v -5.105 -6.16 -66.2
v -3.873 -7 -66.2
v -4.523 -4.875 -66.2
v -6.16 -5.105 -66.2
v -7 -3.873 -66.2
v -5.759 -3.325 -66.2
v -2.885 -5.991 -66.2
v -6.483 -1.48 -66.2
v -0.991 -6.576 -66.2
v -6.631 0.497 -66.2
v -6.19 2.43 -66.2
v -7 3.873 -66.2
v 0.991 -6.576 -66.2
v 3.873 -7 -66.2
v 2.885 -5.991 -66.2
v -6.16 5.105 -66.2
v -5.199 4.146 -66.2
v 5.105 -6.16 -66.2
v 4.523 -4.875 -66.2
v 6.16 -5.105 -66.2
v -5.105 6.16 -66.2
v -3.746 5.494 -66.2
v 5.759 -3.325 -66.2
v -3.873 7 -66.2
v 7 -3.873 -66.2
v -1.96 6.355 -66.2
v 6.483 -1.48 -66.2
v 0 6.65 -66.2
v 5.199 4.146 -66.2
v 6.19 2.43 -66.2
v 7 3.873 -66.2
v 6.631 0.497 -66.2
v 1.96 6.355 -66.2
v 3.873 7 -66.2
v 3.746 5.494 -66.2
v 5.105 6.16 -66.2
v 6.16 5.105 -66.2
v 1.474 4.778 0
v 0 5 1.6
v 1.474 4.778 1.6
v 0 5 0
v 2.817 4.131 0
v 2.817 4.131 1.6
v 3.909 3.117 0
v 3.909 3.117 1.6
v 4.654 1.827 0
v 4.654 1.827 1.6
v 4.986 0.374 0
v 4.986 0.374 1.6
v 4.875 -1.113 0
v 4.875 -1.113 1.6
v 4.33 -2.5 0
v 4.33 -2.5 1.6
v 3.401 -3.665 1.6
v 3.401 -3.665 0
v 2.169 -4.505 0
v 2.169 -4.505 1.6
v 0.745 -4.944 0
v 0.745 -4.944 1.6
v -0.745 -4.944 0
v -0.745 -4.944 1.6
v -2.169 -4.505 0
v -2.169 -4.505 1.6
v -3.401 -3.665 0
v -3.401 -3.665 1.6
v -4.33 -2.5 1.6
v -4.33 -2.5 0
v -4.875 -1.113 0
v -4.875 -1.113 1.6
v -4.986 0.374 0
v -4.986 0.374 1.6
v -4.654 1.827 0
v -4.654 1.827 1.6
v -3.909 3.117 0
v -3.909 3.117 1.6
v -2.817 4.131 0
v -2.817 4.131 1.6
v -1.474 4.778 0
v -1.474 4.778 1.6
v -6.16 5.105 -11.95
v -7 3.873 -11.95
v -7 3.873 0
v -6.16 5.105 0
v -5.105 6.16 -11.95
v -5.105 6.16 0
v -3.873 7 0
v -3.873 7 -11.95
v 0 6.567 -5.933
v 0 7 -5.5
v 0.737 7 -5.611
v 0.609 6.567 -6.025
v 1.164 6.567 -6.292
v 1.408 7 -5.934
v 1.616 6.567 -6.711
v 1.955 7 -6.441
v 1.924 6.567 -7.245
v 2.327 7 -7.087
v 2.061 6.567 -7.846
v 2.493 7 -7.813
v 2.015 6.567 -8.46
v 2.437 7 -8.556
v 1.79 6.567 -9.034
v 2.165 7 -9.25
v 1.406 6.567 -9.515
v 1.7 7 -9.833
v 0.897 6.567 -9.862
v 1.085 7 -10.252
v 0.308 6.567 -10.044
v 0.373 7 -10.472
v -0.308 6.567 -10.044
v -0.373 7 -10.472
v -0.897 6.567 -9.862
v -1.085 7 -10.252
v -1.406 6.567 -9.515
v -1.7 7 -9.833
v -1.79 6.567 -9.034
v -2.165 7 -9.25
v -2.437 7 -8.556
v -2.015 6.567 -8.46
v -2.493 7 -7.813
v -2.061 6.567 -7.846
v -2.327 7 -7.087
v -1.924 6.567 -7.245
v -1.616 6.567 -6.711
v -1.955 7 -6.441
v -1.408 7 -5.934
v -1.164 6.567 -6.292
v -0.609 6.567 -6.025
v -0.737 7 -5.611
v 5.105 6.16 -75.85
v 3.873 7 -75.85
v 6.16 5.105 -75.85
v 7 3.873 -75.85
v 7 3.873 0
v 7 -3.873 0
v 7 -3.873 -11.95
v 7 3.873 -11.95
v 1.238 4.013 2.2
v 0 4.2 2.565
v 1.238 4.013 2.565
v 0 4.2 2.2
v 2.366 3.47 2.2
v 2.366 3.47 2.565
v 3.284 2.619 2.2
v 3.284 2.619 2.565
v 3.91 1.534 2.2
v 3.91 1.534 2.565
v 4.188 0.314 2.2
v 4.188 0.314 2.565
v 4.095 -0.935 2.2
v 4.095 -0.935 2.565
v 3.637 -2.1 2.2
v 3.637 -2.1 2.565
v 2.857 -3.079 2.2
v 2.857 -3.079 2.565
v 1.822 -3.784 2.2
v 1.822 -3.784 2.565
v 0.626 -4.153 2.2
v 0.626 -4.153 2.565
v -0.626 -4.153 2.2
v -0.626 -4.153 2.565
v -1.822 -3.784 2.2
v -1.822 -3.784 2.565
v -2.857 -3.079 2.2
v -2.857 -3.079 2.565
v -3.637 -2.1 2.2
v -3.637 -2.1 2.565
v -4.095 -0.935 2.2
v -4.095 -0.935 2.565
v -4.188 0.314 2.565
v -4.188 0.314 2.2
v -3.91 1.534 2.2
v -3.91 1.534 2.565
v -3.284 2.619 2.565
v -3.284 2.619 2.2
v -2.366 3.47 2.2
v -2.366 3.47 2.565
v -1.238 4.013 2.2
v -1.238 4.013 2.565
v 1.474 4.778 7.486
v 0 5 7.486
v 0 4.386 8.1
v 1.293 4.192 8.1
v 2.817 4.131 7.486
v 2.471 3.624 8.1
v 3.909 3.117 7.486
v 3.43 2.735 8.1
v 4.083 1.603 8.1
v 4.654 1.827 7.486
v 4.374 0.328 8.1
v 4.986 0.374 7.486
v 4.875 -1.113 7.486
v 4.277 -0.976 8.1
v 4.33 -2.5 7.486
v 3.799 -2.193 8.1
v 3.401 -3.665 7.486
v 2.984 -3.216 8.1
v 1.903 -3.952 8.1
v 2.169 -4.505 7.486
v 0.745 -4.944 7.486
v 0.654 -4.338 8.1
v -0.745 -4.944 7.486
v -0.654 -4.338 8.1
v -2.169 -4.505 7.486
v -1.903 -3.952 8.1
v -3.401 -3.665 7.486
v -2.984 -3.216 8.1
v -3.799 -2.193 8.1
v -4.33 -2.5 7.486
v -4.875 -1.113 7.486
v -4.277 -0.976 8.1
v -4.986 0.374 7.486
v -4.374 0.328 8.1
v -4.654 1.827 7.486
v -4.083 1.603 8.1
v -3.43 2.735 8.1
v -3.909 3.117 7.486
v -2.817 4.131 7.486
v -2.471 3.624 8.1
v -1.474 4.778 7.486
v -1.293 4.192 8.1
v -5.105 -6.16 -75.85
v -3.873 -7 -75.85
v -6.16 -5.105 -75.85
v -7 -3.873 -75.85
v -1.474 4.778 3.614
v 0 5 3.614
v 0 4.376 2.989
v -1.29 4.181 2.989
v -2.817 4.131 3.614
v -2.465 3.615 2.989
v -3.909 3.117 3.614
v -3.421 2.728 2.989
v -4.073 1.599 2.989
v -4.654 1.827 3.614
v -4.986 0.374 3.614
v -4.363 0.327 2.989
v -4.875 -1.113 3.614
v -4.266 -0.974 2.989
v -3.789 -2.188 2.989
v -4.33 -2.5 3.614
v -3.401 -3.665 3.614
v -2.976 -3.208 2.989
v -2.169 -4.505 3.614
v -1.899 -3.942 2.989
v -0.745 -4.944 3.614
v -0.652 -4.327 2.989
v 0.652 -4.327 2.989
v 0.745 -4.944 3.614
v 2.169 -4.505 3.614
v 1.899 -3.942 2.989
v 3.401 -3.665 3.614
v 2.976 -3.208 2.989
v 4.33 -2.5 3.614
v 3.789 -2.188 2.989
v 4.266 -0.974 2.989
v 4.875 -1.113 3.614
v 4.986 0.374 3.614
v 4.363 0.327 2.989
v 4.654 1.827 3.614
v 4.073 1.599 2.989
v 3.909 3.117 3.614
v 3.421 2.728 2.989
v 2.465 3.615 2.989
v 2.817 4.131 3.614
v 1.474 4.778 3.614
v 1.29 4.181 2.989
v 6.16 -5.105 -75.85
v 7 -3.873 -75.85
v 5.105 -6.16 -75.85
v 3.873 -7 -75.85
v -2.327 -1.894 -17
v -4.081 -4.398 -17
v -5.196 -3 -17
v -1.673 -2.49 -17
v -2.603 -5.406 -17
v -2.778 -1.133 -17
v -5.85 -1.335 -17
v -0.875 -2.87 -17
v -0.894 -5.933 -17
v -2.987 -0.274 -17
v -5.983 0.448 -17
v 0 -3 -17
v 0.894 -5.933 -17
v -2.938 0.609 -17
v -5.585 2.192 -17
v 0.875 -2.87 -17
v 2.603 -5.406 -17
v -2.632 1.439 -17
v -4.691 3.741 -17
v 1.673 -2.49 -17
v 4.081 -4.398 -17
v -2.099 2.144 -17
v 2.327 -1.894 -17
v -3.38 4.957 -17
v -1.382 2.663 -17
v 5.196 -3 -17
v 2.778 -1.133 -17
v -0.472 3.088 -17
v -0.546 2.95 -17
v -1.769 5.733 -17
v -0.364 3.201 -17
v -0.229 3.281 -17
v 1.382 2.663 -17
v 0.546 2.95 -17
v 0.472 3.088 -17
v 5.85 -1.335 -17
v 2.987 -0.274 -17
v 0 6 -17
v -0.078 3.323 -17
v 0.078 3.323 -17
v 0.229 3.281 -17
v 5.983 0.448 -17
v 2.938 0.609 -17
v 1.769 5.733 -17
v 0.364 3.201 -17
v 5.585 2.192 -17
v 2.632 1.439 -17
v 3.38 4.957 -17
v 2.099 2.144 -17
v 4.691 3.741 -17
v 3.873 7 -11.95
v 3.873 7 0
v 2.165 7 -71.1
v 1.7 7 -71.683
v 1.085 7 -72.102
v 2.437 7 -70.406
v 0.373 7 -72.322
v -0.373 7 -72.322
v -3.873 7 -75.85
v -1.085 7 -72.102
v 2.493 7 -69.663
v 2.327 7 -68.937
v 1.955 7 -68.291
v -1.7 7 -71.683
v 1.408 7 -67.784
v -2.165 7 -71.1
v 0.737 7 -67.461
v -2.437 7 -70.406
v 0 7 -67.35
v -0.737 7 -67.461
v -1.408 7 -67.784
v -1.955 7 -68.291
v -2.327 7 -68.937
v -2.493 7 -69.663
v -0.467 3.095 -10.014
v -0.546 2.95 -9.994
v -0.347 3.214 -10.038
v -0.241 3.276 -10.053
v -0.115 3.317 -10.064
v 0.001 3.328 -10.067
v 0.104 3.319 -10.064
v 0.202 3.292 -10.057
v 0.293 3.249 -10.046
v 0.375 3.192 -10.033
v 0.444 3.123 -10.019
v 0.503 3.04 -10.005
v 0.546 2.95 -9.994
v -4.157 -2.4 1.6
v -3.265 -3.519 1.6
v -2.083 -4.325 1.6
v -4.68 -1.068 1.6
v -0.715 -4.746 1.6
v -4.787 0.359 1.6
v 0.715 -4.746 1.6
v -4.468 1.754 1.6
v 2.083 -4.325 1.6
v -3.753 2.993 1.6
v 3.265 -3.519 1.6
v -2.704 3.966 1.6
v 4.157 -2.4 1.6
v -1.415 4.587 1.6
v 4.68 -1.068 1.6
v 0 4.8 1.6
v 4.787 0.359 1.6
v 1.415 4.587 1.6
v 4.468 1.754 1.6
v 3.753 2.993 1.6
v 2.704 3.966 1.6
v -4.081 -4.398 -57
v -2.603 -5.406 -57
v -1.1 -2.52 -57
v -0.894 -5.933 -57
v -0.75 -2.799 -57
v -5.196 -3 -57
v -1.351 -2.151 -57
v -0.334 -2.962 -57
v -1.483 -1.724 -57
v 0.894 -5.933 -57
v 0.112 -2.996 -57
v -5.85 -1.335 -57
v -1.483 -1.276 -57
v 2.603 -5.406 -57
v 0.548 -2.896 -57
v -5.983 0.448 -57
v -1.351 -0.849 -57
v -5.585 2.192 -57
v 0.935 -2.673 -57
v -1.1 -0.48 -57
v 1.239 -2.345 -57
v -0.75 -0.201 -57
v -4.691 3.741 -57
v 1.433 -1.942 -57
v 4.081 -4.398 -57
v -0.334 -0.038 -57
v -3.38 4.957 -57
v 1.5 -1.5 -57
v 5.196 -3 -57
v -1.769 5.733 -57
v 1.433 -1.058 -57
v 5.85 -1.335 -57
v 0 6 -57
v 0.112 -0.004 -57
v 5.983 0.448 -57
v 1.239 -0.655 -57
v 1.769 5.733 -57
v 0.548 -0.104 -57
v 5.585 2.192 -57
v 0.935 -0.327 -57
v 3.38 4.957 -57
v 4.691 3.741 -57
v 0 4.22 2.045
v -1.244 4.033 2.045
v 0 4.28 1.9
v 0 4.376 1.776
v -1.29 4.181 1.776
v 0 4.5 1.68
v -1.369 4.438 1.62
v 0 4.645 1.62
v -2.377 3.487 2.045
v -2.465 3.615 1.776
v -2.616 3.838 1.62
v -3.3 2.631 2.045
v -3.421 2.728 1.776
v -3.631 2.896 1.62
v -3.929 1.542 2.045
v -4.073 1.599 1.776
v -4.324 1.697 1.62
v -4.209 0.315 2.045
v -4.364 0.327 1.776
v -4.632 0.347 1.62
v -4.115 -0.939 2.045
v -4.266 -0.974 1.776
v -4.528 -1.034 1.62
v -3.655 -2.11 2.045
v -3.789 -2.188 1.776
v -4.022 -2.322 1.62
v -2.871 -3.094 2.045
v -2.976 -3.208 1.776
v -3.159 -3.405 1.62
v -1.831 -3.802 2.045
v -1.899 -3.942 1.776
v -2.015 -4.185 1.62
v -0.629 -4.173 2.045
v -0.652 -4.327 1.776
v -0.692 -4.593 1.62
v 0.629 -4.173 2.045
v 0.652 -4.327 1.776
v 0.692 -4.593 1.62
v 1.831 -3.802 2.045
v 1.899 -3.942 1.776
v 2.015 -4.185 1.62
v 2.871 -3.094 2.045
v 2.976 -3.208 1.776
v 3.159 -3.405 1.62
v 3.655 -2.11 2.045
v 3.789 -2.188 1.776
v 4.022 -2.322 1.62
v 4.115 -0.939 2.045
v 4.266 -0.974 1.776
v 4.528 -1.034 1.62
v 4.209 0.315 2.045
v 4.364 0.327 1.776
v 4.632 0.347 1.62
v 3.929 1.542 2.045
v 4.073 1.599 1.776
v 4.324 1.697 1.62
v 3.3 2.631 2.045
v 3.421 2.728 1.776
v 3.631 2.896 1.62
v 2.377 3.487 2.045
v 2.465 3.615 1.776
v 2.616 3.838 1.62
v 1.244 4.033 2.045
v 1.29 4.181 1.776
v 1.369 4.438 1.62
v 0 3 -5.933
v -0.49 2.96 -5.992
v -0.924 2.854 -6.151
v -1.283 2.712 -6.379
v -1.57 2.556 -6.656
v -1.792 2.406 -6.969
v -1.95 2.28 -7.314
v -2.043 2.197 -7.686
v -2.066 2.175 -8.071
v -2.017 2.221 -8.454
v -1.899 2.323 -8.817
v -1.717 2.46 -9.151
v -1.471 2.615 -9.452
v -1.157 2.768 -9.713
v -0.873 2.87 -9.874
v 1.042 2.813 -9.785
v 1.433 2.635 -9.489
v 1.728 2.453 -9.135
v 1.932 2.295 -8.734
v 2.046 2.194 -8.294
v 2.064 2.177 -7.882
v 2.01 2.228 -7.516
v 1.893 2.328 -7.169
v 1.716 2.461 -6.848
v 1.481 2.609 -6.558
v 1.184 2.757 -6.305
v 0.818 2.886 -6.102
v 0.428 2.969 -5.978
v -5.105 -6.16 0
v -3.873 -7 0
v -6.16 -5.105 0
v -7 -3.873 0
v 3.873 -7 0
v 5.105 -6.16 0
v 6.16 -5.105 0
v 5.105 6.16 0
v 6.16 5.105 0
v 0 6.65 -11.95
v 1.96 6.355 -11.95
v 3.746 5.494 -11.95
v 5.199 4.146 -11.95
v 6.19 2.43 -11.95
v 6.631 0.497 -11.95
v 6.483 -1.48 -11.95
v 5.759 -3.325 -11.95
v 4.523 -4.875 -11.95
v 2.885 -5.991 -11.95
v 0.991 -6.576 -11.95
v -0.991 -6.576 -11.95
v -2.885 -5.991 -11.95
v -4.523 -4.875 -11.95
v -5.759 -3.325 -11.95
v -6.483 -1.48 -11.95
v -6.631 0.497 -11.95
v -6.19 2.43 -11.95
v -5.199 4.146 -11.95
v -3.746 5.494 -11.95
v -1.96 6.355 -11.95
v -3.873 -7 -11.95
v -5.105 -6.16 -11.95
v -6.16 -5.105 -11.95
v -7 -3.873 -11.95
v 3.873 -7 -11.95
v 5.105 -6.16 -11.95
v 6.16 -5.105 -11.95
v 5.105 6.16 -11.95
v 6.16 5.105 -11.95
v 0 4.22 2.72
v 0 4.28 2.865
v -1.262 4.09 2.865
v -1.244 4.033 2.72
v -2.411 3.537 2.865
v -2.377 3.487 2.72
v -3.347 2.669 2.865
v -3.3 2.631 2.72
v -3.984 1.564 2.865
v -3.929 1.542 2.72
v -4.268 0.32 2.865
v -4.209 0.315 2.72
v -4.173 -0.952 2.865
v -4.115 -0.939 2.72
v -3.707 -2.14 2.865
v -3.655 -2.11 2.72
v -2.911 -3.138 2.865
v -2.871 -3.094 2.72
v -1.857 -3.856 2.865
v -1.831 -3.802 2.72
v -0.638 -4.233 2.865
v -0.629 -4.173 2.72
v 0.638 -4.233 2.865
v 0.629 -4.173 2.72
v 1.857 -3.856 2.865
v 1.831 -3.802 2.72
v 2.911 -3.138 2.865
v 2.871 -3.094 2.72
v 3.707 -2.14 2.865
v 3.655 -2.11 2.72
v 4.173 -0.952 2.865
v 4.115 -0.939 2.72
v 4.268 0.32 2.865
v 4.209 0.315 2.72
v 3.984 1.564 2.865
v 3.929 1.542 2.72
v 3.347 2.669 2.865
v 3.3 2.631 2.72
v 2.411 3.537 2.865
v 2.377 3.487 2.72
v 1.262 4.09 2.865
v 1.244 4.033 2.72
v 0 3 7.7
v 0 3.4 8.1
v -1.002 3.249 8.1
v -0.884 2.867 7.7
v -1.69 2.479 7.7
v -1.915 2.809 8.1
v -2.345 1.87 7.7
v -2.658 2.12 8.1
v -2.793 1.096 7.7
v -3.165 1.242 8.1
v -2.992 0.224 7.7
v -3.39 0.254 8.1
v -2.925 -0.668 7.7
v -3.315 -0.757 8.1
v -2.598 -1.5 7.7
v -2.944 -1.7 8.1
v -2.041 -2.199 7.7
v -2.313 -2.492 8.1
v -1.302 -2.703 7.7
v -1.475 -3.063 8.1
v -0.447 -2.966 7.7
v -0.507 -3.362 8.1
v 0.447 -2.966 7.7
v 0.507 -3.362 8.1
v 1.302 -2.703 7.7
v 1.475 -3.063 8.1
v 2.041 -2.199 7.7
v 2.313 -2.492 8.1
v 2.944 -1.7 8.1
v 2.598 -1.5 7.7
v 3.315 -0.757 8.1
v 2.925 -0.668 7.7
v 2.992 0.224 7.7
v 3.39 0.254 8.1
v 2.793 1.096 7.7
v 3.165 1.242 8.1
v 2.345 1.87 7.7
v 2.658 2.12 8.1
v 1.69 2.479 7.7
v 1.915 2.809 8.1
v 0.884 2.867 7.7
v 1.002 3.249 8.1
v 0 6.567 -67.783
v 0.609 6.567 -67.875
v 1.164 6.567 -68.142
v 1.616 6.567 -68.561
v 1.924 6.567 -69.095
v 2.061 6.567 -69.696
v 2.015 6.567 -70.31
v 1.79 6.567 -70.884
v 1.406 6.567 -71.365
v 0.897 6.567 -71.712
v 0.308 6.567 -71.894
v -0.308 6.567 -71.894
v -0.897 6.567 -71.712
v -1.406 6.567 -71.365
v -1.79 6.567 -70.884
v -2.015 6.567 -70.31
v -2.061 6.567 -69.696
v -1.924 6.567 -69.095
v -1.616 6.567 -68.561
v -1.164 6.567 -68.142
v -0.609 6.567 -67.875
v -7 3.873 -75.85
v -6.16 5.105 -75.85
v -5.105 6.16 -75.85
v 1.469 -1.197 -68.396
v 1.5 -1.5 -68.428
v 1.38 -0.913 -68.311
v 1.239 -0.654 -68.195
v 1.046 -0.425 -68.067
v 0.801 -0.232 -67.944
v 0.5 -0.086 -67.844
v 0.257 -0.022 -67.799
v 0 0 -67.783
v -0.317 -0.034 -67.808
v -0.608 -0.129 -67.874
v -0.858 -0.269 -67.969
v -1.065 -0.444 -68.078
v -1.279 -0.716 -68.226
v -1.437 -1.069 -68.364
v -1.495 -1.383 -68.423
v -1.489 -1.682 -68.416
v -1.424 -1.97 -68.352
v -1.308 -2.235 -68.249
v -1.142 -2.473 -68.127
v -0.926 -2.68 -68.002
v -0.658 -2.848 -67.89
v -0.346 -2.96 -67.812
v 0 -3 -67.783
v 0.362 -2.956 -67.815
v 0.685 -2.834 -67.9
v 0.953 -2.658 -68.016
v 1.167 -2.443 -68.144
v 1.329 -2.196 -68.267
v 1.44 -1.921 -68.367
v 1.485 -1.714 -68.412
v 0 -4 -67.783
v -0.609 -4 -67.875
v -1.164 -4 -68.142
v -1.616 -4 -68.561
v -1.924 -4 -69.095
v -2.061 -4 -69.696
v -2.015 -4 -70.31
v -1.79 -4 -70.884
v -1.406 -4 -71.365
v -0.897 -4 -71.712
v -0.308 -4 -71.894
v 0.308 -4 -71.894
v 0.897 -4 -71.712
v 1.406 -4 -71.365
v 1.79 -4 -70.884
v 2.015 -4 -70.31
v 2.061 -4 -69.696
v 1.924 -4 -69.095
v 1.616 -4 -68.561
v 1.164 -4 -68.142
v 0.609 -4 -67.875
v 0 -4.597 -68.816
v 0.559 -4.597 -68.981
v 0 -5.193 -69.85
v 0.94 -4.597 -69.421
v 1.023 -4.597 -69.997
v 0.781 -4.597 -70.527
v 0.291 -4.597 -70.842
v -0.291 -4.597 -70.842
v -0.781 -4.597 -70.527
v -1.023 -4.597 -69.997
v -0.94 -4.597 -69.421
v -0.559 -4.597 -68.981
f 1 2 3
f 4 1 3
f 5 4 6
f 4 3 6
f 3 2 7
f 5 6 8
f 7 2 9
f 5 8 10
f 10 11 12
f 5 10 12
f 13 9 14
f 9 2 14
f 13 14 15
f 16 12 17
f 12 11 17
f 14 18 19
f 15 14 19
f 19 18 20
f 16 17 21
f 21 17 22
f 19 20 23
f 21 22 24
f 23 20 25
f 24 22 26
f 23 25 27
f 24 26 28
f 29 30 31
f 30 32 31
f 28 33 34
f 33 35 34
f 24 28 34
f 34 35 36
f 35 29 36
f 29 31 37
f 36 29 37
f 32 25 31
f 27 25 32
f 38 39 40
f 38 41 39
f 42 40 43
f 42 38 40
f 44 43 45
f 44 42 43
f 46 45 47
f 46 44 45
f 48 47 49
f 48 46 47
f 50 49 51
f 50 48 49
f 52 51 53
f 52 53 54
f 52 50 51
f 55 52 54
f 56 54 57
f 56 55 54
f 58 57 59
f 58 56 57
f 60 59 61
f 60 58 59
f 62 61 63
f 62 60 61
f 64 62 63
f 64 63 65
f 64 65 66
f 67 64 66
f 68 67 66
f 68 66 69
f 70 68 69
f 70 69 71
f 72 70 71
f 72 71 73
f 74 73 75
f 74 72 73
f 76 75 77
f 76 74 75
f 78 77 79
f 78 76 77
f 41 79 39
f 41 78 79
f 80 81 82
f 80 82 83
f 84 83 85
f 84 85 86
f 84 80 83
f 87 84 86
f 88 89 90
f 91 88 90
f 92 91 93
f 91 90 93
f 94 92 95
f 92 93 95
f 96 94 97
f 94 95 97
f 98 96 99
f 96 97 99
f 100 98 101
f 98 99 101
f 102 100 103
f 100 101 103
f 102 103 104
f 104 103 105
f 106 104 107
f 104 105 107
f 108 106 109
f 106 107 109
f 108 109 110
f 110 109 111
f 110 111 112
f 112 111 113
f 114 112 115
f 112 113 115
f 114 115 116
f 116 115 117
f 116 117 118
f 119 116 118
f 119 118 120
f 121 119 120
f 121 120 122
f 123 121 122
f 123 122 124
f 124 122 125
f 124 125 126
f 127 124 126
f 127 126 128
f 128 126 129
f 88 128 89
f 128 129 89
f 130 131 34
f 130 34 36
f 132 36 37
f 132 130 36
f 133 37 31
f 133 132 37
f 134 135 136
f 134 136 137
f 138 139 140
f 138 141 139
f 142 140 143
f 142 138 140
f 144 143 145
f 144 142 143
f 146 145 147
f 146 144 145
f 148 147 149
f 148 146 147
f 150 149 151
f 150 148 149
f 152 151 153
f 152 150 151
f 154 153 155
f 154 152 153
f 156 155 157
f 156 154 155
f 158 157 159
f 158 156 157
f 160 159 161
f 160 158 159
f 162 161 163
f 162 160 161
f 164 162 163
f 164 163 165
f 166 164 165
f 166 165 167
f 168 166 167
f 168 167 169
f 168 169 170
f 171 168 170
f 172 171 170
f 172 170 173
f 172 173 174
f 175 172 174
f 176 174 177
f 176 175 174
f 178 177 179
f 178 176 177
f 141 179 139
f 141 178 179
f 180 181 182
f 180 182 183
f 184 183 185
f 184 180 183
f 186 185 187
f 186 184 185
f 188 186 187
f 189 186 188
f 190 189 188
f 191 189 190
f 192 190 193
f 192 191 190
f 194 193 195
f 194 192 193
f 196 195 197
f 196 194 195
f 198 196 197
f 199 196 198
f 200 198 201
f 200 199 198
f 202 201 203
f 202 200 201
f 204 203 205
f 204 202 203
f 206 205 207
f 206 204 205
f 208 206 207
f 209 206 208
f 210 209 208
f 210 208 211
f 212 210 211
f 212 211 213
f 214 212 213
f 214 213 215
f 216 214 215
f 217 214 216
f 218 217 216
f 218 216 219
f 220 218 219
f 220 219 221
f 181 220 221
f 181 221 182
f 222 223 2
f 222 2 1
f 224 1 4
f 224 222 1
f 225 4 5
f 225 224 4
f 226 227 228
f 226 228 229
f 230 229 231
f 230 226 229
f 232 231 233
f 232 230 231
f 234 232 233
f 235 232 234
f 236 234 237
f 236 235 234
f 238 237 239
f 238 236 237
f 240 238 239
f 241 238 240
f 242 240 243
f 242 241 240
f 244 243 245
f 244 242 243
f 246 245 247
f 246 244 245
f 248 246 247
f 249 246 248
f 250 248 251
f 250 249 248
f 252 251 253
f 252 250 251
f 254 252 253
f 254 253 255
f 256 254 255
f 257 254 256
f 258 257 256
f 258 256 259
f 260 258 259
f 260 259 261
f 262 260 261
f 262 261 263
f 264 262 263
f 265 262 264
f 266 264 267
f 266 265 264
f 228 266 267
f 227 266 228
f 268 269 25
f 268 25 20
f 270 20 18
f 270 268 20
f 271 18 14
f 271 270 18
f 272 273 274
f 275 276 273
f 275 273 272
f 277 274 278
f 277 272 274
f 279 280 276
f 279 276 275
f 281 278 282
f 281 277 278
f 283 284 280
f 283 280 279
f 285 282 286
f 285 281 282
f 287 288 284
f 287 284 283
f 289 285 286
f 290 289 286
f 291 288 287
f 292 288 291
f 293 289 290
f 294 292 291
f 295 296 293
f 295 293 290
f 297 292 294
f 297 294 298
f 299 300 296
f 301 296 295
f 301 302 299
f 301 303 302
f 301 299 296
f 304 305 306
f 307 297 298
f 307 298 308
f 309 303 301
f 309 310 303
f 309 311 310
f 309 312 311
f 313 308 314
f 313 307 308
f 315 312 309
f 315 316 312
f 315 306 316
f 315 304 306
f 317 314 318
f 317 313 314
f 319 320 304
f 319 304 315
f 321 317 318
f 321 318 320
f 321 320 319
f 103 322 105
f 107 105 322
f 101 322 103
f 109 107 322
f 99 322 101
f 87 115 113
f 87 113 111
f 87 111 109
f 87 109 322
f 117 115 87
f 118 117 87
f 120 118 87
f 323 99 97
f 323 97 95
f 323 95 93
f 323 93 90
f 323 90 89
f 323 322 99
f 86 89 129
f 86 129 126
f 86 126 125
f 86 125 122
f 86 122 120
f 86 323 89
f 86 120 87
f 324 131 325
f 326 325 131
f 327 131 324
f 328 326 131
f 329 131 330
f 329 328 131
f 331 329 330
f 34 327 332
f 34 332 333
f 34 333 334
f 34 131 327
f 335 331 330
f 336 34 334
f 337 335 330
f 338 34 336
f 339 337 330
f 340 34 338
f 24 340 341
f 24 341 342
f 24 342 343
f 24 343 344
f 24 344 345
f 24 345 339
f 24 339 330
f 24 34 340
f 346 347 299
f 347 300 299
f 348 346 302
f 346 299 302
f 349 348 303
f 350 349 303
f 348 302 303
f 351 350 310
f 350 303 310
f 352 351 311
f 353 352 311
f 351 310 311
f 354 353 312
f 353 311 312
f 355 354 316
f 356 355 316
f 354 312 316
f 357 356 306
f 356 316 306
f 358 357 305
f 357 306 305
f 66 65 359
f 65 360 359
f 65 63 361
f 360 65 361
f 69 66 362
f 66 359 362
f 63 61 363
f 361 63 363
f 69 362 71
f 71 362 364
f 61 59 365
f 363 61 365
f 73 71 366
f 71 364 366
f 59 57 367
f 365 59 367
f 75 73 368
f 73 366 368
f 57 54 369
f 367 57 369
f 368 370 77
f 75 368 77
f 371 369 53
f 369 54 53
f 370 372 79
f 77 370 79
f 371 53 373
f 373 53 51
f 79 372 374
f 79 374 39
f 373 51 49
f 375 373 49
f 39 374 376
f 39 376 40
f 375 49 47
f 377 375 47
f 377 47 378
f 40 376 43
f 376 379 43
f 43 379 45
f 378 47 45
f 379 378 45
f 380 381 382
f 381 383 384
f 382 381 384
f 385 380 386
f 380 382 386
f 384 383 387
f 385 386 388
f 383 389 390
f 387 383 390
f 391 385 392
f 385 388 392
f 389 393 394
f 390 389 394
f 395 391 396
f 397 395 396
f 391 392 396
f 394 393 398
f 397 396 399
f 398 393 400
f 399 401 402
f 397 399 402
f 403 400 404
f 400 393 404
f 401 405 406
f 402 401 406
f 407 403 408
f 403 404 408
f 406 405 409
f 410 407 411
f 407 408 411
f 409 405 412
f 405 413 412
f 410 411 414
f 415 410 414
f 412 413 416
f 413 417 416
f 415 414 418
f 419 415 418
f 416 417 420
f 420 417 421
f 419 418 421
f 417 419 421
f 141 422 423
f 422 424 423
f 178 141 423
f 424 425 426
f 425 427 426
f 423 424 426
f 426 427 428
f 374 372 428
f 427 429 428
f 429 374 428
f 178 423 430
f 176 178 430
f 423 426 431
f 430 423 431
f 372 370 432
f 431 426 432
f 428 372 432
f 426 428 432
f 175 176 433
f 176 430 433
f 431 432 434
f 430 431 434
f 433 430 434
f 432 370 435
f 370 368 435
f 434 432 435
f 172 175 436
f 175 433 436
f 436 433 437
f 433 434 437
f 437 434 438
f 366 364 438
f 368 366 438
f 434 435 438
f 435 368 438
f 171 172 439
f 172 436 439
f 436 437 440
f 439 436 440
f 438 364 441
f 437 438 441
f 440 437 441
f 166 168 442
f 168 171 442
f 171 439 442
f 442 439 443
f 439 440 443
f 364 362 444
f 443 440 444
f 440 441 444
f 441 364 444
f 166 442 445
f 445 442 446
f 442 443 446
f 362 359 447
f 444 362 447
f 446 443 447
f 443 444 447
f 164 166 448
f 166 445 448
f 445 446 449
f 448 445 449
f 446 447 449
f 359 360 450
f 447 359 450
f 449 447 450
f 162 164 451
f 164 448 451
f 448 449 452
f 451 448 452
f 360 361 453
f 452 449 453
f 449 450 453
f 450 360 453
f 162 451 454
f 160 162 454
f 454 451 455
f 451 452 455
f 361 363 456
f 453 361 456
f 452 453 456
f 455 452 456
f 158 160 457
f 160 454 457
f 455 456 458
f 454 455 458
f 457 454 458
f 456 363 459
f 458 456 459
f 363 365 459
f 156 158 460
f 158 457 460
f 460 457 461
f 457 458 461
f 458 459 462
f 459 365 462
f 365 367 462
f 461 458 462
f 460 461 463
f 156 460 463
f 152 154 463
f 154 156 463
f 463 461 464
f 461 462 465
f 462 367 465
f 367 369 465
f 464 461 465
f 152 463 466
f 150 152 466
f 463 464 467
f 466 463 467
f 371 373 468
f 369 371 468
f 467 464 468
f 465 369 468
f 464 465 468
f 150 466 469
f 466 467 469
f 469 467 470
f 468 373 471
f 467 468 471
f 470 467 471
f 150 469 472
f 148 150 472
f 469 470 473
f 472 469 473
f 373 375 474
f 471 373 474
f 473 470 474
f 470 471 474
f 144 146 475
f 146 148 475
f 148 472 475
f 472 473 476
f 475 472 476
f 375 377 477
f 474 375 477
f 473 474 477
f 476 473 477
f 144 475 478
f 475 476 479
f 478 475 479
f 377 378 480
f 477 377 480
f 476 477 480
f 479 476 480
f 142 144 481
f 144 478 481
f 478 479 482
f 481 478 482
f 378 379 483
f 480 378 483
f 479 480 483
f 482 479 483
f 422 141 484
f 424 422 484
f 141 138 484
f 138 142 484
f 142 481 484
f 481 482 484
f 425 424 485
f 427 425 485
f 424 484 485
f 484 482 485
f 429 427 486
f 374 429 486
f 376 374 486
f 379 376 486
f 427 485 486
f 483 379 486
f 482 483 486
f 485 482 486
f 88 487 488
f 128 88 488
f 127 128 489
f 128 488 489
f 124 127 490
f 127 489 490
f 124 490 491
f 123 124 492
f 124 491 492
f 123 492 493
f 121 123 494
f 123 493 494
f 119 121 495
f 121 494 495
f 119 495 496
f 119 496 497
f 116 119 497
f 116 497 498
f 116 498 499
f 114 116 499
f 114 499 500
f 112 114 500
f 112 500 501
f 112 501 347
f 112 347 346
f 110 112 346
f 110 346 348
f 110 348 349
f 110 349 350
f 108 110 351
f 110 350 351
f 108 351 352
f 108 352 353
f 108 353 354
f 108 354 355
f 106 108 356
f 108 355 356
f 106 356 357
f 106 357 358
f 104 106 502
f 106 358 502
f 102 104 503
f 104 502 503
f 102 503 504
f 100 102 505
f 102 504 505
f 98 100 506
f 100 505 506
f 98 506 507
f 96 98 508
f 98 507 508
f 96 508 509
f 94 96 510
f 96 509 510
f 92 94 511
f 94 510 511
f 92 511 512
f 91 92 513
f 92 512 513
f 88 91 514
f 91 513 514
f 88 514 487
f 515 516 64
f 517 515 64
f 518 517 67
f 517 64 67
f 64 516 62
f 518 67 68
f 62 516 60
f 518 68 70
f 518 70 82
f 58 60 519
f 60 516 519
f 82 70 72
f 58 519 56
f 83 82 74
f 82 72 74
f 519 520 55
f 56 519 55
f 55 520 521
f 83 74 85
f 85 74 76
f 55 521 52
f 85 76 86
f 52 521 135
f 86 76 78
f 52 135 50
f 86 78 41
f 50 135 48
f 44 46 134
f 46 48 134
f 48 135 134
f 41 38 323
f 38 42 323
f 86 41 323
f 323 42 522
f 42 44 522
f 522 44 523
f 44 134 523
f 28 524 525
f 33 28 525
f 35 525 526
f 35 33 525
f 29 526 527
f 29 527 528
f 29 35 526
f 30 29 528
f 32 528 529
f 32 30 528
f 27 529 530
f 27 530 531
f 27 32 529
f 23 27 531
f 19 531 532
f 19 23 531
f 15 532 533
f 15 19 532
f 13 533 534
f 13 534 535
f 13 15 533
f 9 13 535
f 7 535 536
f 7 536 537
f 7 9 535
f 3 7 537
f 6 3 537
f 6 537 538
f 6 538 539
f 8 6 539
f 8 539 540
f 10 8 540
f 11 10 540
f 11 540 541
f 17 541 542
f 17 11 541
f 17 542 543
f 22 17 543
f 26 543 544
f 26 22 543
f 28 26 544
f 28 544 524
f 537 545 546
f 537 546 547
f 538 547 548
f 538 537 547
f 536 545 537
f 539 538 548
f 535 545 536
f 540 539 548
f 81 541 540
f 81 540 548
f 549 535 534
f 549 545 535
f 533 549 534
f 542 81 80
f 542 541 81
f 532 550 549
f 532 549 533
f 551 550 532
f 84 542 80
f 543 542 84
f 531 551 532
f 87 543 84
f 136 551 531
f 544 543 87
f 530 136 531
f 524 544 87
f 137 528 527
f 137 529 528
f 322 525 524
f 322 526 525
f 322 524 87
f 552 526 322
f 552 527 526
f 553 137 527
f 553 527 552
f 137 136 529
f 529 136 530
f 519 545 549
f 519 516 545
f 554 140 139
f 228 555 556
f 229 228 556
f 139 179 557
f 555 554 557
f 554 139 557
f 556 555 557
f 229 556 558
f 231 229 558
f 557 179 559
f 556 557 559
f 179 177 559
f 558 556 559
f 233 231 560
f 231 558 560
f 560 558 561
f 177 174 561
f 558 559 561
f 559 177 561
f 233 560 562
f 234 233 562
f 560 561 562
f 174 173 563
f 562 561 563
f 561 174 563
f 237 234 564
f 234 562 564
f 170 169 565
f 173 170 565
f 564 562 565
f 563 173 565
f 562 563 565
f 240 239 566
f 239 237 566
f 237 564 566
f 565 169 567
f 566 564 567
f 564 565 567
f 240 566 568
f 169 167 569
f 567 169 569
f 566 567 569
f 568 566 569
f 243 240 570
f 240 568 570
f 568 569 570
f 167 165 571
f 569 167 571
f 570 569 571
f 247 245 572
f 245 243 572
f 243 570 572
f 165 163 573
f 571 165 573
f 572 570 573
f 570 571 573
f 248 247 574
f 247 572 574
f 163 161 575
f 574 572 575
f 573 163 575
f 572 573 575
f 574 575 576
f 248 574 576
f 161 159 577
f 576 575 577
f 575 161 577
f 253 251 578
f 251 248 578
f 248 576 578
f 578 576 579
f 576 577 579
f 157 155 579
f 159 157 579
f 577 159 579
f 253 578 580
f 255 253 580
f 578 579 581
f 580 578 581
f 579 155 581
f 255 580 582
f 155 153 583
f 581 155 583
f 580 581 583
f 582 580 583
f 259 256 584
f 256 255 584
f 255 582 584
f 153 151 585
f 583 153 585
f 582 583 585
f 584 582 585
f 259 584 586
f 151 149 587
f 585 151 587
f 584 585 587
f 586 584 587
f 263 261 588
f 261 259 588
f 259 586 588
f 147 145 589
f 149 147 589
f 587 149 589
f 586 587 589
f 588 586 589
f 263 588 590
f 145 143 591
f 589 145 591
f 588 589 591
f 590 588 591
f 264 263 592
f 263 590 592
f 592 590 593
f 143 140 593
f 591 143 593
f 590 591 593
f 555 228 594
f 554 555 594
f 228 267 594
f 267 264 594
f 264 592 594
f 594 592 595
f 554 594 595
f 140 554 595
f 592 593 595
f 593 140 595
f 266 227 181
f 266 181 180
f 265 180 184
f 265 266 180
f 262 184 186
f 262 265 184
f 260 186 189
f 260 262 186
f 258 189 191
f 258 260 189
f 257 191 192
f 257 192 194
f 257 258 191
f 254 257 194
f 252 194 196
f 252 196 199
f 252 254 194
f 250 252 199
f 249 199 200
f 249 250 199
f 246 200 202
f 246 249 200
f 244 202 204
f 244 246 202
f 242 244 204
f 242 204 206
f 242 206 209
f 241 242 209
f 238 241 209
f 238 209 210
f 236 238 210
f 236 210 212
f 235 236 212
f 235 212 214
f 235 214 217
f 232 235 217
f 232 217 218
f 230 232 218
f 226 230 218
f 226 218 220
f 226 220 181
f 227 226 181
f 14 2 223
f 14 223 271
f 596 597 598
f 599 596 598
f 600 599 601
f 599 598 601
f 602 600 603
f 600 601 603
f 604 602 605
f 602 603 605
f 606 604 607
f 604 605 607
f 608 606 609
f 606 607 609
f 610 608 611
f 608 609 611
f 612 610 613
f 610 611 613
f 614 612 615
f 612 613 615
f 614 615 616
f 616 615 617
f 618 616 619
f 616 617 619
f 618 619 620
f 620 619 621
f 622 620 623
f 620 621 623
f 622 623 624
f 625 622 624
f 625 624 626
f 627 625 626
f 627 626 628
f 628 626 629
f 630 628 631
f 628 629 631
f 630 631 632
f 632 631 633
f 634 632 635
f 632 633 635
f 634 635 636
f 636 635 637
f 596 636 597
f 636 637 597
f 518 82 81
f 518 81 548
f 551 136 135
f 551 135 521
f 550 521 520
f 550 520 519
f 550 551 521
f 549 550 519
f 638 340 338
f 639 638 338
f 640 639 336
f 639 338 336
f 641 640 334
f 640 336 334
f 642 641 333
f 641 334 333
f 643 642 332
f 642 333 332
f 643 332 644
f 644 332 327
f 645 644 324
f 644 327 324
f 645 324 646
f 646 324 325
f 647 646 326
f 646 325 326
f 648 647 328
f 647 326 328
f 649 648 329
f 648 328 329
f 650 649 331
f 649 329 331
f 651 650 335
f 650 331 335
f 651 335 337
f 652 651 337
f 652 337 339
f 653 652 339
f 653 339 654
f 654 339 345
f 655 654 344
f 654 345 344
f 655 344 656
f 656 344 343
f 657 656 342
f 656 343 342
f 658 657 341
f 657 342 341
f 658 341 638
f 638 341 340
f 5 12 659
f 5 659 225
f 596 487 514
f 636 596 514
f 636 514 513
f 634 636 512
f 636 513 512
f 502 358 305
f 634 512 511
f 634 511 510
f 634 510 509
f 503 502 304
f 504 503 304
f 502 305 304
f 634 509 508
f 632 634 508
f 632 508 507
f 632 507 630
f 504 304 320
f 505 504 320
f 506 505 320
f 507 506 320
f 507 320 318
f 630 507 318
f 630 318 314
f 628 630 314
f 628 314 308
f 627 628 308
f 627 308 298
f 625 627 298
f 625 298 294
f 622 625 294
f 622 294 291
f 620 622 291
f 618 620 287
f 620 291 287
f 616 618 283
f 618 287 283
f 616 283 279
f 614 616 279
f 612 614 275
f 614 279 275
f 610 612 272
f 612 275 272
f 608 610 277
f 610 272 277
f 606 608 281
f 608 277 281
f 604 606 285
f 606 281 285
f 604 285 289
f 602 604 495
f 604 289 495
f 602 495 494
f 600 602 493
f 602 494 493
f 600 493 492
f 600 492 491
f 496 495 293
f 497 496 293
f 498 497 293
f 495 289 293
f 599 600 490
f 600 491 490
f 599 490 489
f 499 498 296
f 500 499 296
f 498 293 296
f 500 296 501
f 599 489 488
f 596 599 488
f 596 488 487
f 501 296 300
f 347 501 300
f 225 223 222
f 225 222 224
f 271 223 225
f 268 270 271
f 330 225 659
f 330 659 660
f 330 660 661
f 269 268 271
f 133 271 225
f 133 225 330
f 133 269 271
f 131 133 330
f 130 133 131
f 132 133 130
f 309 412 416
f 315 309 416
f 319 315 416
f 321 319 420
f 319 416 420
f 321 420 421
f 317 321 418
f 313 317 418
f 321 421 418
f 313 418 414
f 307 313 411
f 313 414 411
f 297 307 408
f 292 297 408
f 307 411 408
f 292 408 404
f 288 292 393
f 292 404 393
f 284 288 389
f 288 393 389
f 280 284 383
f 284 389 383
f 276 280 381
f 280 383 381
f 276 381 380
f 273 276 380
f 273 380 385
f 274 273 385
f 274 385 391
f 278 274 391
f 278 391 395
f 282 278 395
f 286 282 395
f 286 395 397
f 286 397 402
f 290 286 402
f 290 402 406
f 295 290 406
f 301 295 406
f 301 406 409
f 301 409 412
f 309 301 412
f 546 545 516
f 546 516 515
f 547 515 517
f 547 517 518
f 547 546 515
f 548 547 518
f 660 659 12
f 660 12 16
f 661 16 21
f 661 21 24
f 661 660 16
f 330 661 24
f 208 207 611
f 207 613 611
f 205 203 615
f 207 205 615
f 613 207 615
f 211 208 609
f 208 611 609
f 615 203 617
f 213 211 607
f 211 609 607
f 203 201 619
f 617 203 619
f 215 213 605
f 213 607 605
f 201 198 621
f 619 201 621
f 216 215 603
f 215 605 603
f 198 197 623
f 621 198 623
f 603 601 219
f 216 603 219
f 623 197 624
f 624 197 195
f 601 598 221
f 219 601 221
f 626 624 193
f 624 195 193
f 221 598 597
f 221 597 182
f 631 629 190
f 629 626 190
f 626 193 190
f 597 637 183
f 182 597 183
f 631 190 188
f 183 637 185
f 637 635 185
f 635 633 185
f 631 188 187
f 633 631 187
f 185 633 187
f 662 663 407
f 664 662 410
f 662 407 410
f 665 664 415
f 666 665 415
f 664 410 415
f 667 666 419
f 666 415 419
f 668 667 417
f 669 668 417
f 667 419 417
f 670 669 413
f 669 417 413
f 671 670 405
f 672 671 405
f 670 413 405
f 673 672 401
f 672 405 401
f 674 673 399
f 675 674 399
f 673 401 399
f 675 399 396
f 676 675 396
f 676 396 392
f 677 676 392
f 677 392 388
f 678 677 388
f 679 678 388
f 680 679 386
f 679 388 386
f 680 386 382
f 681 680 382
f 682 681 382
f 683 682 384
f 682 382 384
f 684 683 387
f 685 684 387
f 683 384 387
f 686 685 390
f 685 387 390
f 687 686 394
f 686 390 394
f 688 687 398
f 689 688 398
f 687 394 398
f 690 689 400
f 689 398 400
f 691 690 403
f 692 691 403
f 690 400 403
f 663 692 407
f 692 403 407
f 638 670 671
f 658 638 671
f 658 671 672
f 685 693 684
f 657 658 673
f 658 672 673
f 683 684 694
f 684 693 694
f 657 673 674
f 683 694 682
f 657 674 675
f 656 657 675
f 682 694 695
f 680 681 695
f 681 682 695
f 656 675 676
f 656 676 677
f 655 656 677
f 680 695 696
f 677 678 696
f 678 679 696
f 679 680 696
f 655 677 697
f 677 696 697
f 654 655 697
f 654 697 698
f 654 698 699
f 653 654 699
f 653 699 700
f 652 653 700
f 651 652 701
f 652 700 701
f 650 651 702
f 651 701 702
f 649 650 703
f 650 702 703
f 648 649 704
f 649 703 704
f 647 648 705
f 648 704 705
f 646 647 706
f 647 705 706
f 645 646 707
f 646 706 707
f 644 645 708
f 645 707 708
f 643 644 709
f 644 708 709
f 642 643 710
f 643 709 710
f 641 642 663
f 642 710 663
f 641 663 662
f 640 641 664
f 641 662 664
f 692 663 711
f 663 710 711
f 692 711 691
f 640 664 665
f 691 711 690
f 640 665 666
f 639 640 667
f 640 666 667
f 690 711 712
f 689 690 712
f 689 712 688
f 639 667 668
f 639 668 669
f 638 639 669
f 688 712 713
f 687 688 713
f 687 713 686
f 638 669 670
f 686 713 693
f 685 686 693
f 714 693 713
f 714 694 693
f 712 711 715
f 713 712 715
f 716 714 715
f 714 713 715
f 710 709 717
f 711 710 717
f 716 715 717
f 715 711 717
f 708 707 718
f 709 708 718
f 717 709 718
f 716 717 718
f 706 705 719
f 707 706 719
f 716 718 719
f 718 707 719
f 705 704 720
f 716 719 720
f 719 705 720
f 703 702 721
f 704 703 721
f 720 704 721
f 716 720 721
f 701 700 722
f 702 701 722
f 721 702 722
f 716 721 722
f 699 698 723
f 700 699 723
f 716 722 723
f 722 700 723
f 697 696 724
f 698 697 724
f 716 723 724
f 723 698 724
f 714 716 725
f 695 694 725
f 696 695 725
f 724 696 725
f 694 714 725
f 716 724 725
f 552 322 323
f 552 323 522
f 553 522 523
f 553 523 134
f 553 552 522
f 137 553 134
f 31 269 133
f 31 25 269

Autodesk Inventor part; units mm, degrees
sketch "Sketch_12" plane through (0, 0, 0) normal (1, 0, 0) x (0, 1, 0)
  line L0 (0, -75.85) -> (0, 0)
  line L1 (0, 0) -> (8, 0)
  line L2 (8, 0) -> (8, -11.95)
  line L3 (8, -11.95) -> (6.65, -11.95)
  line L4 (6.65, -11.95) -> (6.65, -66.2)
  line L5 (6.65, -66.2) -> (8, -66.2)
  line L6 (8, -66.2) -> (8, -75.85)
  line L7 (8, -75.85) -> (0, -75.85)
  line L8 (0, -75.85) -> (0, 0)
revolve "Revolution1" add sketch "Sketch_12" angle 360 about axis through (0, 0, -75.85) along (0, 0, -1)
sketch "Sketch_3" plane through (0, 0, 0) normal (1, 0, 0) x (0, 1, 0)
  line L0 (0, 0) -> (0, 8.1)
  line L1 (0, 8.1) -> (4.3865, 8.1)
  line L2 (4.3865, 8.1) -> (5, 7.4865)
  line L3 (5, 7.4865) -> (5, 3.6135)
  line L4 (5, 3.6135) -> (4.3757, 2.9892)
  arc A0 (4.3757, 2.9892) -> (4.2, 2.565) centre (4.8, 2.565) ccw
  line L5 (4.2, 2.565) -> (4.2, 2.2)
  arc A1 (4.2, 2.2) -> (4.8, 1.6) centre (4.8, 2.2) ccw
  line L6 (4.8, 1.6) -> (5, 1.6)
  line L7 (5, 1.6) -> (5, 0)
  line L8 (5, 0) -> (0, 0)
  line L9 (0, 0) -> (0, 8.1)
revolve "Revolution2" add sketch "Sketch_3" angle 360 about axis through (0, 0, 0) along (0, 0, -1)
thread "Thread1" size "M10x1" class "6g" standard "ISO Metric profile" full length
sketch "Sketch_7" plane through (0, 0, 0) normal (0, 0, 1) x (1, 0, 0)
  line L0 (-14, 14) -> (-14, -14)
  line L1 (-14, -14) -> (14, -14)
  line L2 (14, -14) -> (14, 14)
  line L3 (14, 14) -> (-14, 14)
  line L4 (-7, 7) -> (-7, -7)
  line L5 (-7, -7) -> (7, -7)
  line L6 (7, -7) -> (7, 7)
  line L7 (7, 7) -> (-7, 7)
extrude "Extrusion1" cut sketch "Sketch_7" against normal blind 75.85
sketch "Sketch4" plane through (-3.873, 7, -11.95) normal (0, 1, 0) x (1, 0, 0)
  point P0 (3.873, -3.95)
hole "Hole1" at (0, 7, -8) direction (0, -1, 0) diameter 4.134 depth 7 countersink diameter 5 countersink angle 90 thread size "M5x0.8" class "6H" standard "ISO Metric profile"
sketch "Sketch5" plane through (-3.873, 7, -66.2) normal (0, 1, 0) x (1, 0, 0)
  point P0 (3.873, 3.65)
hole "Hole2" at (0, 7, -69.85) direction (0, -1, 0) diameter 4.134 depth 11 tip angle 120 countersink diameter 5 countersink angle 90 thread size "M5x0.8" class "6H" standard "ISO Metric profile"
sketch "Sketch_10" plane through (0, 0, 0) normal (1, 0, 0) x (0, 1, 0)
  line L0 (0, -57) -> (0, 8.1)
  line L1 (0, 8.1) -> (3.4, 8.1)
  line L2 (3.4, 8.1) -> (3, 7.7)
  line L3 (3, 7.7) -> (3, -17)
  line L4 (3, -17) -> (6, -17)
  line L5 (6, -17) -> (6, -57)
  line L6 (6, -57) -> (0, -57)
  line L7 (0, -57) -> (0, 8.1)
revolve "Revolution3" cut sketch "Sketch_10" angle 360 about axis through (0, 0, -57) along (0, 0, -1)
ref_plane "ANBAU_XY" through (0, 0, 0) normal (0, 0, 1) x (1, 0, 0)
ref_plane "ANBAU_YZ" through (0, 0, 0) normal (1, 0, 0) x (0, 1, 0)
ref_plane "ANBAU_ZX" through (0, 0, 0) normal (0, 1, 0) x (0, 0, 1)
ref_plane "FDT_FRONT_XY" through (0, 0, 0) normal (0, 0, -1) x (-1, 0, 0)
ref_plane "FDT_FRONT_YZ" through (0, 0, 0) normal (-1, 0, 0) x (0, 1, 0)
ref_plane "FDT_FRONT_ZX" through (0, 0, 0) normal (0, 1, 0) x (0, 0, -1)
ref_plane "FDT_QSFRONT_XY" through (0, 7, -8) normal (0, 1, 0) x (1, 0, 0)
ref_plane "FDT_QSFRONT_YZ" through (0, 7, -8) normal (1, 0, 0) x (0, 0, -1)
ref_plane "FDT_QSFRONT_ZX" through (0, 7, -8) normal (0, 0, -1) x (0, 1, 0)
ref_plane "FDT_QSREAR_XY" through (0, 7, -69.85) normal (0, 1, 0) x (1, 0, 0)
ref_plane "FDT_QSREAR_YZ" through (0, 7, -69.85) normal (1, 0, 0) x (0, 0, -1)
ref_plane "FDT_QSREAR_ZX" through (0, 7, -69.85) normal (0, 0, -1) x (0, 1, 0)
ref_plane "FDT_REAR_XY" through (0, 0, -75.85) normal (0, 0, 1) x (-1, 0, 0)
ref_plane "FDT_REAR_YZ" through (0, 0, -75.85) normal (-1, 0, 0) x (0, -1, 0)
ref_plane "FDT_REAR_ZX" through (0, 0, -75.85) normal (0, -1, 0) x (0, 0, 1)
ref_plane "FDT_SMBR1_XY" through (0, 0, -21.45) normal (0, 0, 1) x (1, 0, 0)
ref_plane "FDT_SMBR1_YZ" through (0, 0, -21.45) normal (1, 0, 0) x (0, 1, 0)
ref_plane "FDT_SMBR1_ZX" through (0, 0, -21.45) normal (0, 1, 0) x (0, 0, 1)
ref_plane "FDT_SMBR2_XY" through (0, 0, -56.7) normal (0, 0, 1) x (1, 0, 0)
ref_plane "FDT_SMBR2_YZ" through (0, 0, -56.7) normal (1, 0, 0) x (0, 1, 0)
ref_plane "FDT_SMBR2_ZX" through (0, 0, -56.7) normal (0, 1, 0) x (0, 0, 1)
ref_plane "to_nut_XY" through (0, 0, 3.6) normal (0, 0, 1) x (1, 0, 0)
ref_plane "to_nut_YZ" through (0, 0, 3.6) normal (1, 0, 0) x (0, 1, 0)
ref_plane "to_nut_ZX" through (0, 0, 3.6) normal (0, 1, 0) x (0, 0, 1)
ref_plane "to_piston_XY" through (0, 0, -57) normal (0, 0, 1) x (1, 0, 0)
ref_plane "to_piston_YZ" through (0, 0, -57) normal (1, 0, 0) x (0, 1, 0)
ref_plane "to_piston_ZX" through (0, 0, -57) normal (0, 1, 0) x (0, 0, 1)
sketch "Szkic7" plane through (0, 0, -17) normal (0, 0, -1) x (-1, 0, 0)
  circle A0 centre (0, 2.745) radius 0.5831
  point P0 (0, 0)
extrude "Wyciągnięcie proste2" cut sketch "Szkic7" against normal blind 9.5
sketch "Szkic8" plane through (0, 0, -57) normal (0, 0, 1) x (1, 0, 0)
  circle A0 centre (0, -1.5) radius 1.5
  point P0 (0, 0)
extrude "Wyciągnięcie proste3" cut sketch "Szkic8" against normal blind 12.5
properties part number "Korpus"
